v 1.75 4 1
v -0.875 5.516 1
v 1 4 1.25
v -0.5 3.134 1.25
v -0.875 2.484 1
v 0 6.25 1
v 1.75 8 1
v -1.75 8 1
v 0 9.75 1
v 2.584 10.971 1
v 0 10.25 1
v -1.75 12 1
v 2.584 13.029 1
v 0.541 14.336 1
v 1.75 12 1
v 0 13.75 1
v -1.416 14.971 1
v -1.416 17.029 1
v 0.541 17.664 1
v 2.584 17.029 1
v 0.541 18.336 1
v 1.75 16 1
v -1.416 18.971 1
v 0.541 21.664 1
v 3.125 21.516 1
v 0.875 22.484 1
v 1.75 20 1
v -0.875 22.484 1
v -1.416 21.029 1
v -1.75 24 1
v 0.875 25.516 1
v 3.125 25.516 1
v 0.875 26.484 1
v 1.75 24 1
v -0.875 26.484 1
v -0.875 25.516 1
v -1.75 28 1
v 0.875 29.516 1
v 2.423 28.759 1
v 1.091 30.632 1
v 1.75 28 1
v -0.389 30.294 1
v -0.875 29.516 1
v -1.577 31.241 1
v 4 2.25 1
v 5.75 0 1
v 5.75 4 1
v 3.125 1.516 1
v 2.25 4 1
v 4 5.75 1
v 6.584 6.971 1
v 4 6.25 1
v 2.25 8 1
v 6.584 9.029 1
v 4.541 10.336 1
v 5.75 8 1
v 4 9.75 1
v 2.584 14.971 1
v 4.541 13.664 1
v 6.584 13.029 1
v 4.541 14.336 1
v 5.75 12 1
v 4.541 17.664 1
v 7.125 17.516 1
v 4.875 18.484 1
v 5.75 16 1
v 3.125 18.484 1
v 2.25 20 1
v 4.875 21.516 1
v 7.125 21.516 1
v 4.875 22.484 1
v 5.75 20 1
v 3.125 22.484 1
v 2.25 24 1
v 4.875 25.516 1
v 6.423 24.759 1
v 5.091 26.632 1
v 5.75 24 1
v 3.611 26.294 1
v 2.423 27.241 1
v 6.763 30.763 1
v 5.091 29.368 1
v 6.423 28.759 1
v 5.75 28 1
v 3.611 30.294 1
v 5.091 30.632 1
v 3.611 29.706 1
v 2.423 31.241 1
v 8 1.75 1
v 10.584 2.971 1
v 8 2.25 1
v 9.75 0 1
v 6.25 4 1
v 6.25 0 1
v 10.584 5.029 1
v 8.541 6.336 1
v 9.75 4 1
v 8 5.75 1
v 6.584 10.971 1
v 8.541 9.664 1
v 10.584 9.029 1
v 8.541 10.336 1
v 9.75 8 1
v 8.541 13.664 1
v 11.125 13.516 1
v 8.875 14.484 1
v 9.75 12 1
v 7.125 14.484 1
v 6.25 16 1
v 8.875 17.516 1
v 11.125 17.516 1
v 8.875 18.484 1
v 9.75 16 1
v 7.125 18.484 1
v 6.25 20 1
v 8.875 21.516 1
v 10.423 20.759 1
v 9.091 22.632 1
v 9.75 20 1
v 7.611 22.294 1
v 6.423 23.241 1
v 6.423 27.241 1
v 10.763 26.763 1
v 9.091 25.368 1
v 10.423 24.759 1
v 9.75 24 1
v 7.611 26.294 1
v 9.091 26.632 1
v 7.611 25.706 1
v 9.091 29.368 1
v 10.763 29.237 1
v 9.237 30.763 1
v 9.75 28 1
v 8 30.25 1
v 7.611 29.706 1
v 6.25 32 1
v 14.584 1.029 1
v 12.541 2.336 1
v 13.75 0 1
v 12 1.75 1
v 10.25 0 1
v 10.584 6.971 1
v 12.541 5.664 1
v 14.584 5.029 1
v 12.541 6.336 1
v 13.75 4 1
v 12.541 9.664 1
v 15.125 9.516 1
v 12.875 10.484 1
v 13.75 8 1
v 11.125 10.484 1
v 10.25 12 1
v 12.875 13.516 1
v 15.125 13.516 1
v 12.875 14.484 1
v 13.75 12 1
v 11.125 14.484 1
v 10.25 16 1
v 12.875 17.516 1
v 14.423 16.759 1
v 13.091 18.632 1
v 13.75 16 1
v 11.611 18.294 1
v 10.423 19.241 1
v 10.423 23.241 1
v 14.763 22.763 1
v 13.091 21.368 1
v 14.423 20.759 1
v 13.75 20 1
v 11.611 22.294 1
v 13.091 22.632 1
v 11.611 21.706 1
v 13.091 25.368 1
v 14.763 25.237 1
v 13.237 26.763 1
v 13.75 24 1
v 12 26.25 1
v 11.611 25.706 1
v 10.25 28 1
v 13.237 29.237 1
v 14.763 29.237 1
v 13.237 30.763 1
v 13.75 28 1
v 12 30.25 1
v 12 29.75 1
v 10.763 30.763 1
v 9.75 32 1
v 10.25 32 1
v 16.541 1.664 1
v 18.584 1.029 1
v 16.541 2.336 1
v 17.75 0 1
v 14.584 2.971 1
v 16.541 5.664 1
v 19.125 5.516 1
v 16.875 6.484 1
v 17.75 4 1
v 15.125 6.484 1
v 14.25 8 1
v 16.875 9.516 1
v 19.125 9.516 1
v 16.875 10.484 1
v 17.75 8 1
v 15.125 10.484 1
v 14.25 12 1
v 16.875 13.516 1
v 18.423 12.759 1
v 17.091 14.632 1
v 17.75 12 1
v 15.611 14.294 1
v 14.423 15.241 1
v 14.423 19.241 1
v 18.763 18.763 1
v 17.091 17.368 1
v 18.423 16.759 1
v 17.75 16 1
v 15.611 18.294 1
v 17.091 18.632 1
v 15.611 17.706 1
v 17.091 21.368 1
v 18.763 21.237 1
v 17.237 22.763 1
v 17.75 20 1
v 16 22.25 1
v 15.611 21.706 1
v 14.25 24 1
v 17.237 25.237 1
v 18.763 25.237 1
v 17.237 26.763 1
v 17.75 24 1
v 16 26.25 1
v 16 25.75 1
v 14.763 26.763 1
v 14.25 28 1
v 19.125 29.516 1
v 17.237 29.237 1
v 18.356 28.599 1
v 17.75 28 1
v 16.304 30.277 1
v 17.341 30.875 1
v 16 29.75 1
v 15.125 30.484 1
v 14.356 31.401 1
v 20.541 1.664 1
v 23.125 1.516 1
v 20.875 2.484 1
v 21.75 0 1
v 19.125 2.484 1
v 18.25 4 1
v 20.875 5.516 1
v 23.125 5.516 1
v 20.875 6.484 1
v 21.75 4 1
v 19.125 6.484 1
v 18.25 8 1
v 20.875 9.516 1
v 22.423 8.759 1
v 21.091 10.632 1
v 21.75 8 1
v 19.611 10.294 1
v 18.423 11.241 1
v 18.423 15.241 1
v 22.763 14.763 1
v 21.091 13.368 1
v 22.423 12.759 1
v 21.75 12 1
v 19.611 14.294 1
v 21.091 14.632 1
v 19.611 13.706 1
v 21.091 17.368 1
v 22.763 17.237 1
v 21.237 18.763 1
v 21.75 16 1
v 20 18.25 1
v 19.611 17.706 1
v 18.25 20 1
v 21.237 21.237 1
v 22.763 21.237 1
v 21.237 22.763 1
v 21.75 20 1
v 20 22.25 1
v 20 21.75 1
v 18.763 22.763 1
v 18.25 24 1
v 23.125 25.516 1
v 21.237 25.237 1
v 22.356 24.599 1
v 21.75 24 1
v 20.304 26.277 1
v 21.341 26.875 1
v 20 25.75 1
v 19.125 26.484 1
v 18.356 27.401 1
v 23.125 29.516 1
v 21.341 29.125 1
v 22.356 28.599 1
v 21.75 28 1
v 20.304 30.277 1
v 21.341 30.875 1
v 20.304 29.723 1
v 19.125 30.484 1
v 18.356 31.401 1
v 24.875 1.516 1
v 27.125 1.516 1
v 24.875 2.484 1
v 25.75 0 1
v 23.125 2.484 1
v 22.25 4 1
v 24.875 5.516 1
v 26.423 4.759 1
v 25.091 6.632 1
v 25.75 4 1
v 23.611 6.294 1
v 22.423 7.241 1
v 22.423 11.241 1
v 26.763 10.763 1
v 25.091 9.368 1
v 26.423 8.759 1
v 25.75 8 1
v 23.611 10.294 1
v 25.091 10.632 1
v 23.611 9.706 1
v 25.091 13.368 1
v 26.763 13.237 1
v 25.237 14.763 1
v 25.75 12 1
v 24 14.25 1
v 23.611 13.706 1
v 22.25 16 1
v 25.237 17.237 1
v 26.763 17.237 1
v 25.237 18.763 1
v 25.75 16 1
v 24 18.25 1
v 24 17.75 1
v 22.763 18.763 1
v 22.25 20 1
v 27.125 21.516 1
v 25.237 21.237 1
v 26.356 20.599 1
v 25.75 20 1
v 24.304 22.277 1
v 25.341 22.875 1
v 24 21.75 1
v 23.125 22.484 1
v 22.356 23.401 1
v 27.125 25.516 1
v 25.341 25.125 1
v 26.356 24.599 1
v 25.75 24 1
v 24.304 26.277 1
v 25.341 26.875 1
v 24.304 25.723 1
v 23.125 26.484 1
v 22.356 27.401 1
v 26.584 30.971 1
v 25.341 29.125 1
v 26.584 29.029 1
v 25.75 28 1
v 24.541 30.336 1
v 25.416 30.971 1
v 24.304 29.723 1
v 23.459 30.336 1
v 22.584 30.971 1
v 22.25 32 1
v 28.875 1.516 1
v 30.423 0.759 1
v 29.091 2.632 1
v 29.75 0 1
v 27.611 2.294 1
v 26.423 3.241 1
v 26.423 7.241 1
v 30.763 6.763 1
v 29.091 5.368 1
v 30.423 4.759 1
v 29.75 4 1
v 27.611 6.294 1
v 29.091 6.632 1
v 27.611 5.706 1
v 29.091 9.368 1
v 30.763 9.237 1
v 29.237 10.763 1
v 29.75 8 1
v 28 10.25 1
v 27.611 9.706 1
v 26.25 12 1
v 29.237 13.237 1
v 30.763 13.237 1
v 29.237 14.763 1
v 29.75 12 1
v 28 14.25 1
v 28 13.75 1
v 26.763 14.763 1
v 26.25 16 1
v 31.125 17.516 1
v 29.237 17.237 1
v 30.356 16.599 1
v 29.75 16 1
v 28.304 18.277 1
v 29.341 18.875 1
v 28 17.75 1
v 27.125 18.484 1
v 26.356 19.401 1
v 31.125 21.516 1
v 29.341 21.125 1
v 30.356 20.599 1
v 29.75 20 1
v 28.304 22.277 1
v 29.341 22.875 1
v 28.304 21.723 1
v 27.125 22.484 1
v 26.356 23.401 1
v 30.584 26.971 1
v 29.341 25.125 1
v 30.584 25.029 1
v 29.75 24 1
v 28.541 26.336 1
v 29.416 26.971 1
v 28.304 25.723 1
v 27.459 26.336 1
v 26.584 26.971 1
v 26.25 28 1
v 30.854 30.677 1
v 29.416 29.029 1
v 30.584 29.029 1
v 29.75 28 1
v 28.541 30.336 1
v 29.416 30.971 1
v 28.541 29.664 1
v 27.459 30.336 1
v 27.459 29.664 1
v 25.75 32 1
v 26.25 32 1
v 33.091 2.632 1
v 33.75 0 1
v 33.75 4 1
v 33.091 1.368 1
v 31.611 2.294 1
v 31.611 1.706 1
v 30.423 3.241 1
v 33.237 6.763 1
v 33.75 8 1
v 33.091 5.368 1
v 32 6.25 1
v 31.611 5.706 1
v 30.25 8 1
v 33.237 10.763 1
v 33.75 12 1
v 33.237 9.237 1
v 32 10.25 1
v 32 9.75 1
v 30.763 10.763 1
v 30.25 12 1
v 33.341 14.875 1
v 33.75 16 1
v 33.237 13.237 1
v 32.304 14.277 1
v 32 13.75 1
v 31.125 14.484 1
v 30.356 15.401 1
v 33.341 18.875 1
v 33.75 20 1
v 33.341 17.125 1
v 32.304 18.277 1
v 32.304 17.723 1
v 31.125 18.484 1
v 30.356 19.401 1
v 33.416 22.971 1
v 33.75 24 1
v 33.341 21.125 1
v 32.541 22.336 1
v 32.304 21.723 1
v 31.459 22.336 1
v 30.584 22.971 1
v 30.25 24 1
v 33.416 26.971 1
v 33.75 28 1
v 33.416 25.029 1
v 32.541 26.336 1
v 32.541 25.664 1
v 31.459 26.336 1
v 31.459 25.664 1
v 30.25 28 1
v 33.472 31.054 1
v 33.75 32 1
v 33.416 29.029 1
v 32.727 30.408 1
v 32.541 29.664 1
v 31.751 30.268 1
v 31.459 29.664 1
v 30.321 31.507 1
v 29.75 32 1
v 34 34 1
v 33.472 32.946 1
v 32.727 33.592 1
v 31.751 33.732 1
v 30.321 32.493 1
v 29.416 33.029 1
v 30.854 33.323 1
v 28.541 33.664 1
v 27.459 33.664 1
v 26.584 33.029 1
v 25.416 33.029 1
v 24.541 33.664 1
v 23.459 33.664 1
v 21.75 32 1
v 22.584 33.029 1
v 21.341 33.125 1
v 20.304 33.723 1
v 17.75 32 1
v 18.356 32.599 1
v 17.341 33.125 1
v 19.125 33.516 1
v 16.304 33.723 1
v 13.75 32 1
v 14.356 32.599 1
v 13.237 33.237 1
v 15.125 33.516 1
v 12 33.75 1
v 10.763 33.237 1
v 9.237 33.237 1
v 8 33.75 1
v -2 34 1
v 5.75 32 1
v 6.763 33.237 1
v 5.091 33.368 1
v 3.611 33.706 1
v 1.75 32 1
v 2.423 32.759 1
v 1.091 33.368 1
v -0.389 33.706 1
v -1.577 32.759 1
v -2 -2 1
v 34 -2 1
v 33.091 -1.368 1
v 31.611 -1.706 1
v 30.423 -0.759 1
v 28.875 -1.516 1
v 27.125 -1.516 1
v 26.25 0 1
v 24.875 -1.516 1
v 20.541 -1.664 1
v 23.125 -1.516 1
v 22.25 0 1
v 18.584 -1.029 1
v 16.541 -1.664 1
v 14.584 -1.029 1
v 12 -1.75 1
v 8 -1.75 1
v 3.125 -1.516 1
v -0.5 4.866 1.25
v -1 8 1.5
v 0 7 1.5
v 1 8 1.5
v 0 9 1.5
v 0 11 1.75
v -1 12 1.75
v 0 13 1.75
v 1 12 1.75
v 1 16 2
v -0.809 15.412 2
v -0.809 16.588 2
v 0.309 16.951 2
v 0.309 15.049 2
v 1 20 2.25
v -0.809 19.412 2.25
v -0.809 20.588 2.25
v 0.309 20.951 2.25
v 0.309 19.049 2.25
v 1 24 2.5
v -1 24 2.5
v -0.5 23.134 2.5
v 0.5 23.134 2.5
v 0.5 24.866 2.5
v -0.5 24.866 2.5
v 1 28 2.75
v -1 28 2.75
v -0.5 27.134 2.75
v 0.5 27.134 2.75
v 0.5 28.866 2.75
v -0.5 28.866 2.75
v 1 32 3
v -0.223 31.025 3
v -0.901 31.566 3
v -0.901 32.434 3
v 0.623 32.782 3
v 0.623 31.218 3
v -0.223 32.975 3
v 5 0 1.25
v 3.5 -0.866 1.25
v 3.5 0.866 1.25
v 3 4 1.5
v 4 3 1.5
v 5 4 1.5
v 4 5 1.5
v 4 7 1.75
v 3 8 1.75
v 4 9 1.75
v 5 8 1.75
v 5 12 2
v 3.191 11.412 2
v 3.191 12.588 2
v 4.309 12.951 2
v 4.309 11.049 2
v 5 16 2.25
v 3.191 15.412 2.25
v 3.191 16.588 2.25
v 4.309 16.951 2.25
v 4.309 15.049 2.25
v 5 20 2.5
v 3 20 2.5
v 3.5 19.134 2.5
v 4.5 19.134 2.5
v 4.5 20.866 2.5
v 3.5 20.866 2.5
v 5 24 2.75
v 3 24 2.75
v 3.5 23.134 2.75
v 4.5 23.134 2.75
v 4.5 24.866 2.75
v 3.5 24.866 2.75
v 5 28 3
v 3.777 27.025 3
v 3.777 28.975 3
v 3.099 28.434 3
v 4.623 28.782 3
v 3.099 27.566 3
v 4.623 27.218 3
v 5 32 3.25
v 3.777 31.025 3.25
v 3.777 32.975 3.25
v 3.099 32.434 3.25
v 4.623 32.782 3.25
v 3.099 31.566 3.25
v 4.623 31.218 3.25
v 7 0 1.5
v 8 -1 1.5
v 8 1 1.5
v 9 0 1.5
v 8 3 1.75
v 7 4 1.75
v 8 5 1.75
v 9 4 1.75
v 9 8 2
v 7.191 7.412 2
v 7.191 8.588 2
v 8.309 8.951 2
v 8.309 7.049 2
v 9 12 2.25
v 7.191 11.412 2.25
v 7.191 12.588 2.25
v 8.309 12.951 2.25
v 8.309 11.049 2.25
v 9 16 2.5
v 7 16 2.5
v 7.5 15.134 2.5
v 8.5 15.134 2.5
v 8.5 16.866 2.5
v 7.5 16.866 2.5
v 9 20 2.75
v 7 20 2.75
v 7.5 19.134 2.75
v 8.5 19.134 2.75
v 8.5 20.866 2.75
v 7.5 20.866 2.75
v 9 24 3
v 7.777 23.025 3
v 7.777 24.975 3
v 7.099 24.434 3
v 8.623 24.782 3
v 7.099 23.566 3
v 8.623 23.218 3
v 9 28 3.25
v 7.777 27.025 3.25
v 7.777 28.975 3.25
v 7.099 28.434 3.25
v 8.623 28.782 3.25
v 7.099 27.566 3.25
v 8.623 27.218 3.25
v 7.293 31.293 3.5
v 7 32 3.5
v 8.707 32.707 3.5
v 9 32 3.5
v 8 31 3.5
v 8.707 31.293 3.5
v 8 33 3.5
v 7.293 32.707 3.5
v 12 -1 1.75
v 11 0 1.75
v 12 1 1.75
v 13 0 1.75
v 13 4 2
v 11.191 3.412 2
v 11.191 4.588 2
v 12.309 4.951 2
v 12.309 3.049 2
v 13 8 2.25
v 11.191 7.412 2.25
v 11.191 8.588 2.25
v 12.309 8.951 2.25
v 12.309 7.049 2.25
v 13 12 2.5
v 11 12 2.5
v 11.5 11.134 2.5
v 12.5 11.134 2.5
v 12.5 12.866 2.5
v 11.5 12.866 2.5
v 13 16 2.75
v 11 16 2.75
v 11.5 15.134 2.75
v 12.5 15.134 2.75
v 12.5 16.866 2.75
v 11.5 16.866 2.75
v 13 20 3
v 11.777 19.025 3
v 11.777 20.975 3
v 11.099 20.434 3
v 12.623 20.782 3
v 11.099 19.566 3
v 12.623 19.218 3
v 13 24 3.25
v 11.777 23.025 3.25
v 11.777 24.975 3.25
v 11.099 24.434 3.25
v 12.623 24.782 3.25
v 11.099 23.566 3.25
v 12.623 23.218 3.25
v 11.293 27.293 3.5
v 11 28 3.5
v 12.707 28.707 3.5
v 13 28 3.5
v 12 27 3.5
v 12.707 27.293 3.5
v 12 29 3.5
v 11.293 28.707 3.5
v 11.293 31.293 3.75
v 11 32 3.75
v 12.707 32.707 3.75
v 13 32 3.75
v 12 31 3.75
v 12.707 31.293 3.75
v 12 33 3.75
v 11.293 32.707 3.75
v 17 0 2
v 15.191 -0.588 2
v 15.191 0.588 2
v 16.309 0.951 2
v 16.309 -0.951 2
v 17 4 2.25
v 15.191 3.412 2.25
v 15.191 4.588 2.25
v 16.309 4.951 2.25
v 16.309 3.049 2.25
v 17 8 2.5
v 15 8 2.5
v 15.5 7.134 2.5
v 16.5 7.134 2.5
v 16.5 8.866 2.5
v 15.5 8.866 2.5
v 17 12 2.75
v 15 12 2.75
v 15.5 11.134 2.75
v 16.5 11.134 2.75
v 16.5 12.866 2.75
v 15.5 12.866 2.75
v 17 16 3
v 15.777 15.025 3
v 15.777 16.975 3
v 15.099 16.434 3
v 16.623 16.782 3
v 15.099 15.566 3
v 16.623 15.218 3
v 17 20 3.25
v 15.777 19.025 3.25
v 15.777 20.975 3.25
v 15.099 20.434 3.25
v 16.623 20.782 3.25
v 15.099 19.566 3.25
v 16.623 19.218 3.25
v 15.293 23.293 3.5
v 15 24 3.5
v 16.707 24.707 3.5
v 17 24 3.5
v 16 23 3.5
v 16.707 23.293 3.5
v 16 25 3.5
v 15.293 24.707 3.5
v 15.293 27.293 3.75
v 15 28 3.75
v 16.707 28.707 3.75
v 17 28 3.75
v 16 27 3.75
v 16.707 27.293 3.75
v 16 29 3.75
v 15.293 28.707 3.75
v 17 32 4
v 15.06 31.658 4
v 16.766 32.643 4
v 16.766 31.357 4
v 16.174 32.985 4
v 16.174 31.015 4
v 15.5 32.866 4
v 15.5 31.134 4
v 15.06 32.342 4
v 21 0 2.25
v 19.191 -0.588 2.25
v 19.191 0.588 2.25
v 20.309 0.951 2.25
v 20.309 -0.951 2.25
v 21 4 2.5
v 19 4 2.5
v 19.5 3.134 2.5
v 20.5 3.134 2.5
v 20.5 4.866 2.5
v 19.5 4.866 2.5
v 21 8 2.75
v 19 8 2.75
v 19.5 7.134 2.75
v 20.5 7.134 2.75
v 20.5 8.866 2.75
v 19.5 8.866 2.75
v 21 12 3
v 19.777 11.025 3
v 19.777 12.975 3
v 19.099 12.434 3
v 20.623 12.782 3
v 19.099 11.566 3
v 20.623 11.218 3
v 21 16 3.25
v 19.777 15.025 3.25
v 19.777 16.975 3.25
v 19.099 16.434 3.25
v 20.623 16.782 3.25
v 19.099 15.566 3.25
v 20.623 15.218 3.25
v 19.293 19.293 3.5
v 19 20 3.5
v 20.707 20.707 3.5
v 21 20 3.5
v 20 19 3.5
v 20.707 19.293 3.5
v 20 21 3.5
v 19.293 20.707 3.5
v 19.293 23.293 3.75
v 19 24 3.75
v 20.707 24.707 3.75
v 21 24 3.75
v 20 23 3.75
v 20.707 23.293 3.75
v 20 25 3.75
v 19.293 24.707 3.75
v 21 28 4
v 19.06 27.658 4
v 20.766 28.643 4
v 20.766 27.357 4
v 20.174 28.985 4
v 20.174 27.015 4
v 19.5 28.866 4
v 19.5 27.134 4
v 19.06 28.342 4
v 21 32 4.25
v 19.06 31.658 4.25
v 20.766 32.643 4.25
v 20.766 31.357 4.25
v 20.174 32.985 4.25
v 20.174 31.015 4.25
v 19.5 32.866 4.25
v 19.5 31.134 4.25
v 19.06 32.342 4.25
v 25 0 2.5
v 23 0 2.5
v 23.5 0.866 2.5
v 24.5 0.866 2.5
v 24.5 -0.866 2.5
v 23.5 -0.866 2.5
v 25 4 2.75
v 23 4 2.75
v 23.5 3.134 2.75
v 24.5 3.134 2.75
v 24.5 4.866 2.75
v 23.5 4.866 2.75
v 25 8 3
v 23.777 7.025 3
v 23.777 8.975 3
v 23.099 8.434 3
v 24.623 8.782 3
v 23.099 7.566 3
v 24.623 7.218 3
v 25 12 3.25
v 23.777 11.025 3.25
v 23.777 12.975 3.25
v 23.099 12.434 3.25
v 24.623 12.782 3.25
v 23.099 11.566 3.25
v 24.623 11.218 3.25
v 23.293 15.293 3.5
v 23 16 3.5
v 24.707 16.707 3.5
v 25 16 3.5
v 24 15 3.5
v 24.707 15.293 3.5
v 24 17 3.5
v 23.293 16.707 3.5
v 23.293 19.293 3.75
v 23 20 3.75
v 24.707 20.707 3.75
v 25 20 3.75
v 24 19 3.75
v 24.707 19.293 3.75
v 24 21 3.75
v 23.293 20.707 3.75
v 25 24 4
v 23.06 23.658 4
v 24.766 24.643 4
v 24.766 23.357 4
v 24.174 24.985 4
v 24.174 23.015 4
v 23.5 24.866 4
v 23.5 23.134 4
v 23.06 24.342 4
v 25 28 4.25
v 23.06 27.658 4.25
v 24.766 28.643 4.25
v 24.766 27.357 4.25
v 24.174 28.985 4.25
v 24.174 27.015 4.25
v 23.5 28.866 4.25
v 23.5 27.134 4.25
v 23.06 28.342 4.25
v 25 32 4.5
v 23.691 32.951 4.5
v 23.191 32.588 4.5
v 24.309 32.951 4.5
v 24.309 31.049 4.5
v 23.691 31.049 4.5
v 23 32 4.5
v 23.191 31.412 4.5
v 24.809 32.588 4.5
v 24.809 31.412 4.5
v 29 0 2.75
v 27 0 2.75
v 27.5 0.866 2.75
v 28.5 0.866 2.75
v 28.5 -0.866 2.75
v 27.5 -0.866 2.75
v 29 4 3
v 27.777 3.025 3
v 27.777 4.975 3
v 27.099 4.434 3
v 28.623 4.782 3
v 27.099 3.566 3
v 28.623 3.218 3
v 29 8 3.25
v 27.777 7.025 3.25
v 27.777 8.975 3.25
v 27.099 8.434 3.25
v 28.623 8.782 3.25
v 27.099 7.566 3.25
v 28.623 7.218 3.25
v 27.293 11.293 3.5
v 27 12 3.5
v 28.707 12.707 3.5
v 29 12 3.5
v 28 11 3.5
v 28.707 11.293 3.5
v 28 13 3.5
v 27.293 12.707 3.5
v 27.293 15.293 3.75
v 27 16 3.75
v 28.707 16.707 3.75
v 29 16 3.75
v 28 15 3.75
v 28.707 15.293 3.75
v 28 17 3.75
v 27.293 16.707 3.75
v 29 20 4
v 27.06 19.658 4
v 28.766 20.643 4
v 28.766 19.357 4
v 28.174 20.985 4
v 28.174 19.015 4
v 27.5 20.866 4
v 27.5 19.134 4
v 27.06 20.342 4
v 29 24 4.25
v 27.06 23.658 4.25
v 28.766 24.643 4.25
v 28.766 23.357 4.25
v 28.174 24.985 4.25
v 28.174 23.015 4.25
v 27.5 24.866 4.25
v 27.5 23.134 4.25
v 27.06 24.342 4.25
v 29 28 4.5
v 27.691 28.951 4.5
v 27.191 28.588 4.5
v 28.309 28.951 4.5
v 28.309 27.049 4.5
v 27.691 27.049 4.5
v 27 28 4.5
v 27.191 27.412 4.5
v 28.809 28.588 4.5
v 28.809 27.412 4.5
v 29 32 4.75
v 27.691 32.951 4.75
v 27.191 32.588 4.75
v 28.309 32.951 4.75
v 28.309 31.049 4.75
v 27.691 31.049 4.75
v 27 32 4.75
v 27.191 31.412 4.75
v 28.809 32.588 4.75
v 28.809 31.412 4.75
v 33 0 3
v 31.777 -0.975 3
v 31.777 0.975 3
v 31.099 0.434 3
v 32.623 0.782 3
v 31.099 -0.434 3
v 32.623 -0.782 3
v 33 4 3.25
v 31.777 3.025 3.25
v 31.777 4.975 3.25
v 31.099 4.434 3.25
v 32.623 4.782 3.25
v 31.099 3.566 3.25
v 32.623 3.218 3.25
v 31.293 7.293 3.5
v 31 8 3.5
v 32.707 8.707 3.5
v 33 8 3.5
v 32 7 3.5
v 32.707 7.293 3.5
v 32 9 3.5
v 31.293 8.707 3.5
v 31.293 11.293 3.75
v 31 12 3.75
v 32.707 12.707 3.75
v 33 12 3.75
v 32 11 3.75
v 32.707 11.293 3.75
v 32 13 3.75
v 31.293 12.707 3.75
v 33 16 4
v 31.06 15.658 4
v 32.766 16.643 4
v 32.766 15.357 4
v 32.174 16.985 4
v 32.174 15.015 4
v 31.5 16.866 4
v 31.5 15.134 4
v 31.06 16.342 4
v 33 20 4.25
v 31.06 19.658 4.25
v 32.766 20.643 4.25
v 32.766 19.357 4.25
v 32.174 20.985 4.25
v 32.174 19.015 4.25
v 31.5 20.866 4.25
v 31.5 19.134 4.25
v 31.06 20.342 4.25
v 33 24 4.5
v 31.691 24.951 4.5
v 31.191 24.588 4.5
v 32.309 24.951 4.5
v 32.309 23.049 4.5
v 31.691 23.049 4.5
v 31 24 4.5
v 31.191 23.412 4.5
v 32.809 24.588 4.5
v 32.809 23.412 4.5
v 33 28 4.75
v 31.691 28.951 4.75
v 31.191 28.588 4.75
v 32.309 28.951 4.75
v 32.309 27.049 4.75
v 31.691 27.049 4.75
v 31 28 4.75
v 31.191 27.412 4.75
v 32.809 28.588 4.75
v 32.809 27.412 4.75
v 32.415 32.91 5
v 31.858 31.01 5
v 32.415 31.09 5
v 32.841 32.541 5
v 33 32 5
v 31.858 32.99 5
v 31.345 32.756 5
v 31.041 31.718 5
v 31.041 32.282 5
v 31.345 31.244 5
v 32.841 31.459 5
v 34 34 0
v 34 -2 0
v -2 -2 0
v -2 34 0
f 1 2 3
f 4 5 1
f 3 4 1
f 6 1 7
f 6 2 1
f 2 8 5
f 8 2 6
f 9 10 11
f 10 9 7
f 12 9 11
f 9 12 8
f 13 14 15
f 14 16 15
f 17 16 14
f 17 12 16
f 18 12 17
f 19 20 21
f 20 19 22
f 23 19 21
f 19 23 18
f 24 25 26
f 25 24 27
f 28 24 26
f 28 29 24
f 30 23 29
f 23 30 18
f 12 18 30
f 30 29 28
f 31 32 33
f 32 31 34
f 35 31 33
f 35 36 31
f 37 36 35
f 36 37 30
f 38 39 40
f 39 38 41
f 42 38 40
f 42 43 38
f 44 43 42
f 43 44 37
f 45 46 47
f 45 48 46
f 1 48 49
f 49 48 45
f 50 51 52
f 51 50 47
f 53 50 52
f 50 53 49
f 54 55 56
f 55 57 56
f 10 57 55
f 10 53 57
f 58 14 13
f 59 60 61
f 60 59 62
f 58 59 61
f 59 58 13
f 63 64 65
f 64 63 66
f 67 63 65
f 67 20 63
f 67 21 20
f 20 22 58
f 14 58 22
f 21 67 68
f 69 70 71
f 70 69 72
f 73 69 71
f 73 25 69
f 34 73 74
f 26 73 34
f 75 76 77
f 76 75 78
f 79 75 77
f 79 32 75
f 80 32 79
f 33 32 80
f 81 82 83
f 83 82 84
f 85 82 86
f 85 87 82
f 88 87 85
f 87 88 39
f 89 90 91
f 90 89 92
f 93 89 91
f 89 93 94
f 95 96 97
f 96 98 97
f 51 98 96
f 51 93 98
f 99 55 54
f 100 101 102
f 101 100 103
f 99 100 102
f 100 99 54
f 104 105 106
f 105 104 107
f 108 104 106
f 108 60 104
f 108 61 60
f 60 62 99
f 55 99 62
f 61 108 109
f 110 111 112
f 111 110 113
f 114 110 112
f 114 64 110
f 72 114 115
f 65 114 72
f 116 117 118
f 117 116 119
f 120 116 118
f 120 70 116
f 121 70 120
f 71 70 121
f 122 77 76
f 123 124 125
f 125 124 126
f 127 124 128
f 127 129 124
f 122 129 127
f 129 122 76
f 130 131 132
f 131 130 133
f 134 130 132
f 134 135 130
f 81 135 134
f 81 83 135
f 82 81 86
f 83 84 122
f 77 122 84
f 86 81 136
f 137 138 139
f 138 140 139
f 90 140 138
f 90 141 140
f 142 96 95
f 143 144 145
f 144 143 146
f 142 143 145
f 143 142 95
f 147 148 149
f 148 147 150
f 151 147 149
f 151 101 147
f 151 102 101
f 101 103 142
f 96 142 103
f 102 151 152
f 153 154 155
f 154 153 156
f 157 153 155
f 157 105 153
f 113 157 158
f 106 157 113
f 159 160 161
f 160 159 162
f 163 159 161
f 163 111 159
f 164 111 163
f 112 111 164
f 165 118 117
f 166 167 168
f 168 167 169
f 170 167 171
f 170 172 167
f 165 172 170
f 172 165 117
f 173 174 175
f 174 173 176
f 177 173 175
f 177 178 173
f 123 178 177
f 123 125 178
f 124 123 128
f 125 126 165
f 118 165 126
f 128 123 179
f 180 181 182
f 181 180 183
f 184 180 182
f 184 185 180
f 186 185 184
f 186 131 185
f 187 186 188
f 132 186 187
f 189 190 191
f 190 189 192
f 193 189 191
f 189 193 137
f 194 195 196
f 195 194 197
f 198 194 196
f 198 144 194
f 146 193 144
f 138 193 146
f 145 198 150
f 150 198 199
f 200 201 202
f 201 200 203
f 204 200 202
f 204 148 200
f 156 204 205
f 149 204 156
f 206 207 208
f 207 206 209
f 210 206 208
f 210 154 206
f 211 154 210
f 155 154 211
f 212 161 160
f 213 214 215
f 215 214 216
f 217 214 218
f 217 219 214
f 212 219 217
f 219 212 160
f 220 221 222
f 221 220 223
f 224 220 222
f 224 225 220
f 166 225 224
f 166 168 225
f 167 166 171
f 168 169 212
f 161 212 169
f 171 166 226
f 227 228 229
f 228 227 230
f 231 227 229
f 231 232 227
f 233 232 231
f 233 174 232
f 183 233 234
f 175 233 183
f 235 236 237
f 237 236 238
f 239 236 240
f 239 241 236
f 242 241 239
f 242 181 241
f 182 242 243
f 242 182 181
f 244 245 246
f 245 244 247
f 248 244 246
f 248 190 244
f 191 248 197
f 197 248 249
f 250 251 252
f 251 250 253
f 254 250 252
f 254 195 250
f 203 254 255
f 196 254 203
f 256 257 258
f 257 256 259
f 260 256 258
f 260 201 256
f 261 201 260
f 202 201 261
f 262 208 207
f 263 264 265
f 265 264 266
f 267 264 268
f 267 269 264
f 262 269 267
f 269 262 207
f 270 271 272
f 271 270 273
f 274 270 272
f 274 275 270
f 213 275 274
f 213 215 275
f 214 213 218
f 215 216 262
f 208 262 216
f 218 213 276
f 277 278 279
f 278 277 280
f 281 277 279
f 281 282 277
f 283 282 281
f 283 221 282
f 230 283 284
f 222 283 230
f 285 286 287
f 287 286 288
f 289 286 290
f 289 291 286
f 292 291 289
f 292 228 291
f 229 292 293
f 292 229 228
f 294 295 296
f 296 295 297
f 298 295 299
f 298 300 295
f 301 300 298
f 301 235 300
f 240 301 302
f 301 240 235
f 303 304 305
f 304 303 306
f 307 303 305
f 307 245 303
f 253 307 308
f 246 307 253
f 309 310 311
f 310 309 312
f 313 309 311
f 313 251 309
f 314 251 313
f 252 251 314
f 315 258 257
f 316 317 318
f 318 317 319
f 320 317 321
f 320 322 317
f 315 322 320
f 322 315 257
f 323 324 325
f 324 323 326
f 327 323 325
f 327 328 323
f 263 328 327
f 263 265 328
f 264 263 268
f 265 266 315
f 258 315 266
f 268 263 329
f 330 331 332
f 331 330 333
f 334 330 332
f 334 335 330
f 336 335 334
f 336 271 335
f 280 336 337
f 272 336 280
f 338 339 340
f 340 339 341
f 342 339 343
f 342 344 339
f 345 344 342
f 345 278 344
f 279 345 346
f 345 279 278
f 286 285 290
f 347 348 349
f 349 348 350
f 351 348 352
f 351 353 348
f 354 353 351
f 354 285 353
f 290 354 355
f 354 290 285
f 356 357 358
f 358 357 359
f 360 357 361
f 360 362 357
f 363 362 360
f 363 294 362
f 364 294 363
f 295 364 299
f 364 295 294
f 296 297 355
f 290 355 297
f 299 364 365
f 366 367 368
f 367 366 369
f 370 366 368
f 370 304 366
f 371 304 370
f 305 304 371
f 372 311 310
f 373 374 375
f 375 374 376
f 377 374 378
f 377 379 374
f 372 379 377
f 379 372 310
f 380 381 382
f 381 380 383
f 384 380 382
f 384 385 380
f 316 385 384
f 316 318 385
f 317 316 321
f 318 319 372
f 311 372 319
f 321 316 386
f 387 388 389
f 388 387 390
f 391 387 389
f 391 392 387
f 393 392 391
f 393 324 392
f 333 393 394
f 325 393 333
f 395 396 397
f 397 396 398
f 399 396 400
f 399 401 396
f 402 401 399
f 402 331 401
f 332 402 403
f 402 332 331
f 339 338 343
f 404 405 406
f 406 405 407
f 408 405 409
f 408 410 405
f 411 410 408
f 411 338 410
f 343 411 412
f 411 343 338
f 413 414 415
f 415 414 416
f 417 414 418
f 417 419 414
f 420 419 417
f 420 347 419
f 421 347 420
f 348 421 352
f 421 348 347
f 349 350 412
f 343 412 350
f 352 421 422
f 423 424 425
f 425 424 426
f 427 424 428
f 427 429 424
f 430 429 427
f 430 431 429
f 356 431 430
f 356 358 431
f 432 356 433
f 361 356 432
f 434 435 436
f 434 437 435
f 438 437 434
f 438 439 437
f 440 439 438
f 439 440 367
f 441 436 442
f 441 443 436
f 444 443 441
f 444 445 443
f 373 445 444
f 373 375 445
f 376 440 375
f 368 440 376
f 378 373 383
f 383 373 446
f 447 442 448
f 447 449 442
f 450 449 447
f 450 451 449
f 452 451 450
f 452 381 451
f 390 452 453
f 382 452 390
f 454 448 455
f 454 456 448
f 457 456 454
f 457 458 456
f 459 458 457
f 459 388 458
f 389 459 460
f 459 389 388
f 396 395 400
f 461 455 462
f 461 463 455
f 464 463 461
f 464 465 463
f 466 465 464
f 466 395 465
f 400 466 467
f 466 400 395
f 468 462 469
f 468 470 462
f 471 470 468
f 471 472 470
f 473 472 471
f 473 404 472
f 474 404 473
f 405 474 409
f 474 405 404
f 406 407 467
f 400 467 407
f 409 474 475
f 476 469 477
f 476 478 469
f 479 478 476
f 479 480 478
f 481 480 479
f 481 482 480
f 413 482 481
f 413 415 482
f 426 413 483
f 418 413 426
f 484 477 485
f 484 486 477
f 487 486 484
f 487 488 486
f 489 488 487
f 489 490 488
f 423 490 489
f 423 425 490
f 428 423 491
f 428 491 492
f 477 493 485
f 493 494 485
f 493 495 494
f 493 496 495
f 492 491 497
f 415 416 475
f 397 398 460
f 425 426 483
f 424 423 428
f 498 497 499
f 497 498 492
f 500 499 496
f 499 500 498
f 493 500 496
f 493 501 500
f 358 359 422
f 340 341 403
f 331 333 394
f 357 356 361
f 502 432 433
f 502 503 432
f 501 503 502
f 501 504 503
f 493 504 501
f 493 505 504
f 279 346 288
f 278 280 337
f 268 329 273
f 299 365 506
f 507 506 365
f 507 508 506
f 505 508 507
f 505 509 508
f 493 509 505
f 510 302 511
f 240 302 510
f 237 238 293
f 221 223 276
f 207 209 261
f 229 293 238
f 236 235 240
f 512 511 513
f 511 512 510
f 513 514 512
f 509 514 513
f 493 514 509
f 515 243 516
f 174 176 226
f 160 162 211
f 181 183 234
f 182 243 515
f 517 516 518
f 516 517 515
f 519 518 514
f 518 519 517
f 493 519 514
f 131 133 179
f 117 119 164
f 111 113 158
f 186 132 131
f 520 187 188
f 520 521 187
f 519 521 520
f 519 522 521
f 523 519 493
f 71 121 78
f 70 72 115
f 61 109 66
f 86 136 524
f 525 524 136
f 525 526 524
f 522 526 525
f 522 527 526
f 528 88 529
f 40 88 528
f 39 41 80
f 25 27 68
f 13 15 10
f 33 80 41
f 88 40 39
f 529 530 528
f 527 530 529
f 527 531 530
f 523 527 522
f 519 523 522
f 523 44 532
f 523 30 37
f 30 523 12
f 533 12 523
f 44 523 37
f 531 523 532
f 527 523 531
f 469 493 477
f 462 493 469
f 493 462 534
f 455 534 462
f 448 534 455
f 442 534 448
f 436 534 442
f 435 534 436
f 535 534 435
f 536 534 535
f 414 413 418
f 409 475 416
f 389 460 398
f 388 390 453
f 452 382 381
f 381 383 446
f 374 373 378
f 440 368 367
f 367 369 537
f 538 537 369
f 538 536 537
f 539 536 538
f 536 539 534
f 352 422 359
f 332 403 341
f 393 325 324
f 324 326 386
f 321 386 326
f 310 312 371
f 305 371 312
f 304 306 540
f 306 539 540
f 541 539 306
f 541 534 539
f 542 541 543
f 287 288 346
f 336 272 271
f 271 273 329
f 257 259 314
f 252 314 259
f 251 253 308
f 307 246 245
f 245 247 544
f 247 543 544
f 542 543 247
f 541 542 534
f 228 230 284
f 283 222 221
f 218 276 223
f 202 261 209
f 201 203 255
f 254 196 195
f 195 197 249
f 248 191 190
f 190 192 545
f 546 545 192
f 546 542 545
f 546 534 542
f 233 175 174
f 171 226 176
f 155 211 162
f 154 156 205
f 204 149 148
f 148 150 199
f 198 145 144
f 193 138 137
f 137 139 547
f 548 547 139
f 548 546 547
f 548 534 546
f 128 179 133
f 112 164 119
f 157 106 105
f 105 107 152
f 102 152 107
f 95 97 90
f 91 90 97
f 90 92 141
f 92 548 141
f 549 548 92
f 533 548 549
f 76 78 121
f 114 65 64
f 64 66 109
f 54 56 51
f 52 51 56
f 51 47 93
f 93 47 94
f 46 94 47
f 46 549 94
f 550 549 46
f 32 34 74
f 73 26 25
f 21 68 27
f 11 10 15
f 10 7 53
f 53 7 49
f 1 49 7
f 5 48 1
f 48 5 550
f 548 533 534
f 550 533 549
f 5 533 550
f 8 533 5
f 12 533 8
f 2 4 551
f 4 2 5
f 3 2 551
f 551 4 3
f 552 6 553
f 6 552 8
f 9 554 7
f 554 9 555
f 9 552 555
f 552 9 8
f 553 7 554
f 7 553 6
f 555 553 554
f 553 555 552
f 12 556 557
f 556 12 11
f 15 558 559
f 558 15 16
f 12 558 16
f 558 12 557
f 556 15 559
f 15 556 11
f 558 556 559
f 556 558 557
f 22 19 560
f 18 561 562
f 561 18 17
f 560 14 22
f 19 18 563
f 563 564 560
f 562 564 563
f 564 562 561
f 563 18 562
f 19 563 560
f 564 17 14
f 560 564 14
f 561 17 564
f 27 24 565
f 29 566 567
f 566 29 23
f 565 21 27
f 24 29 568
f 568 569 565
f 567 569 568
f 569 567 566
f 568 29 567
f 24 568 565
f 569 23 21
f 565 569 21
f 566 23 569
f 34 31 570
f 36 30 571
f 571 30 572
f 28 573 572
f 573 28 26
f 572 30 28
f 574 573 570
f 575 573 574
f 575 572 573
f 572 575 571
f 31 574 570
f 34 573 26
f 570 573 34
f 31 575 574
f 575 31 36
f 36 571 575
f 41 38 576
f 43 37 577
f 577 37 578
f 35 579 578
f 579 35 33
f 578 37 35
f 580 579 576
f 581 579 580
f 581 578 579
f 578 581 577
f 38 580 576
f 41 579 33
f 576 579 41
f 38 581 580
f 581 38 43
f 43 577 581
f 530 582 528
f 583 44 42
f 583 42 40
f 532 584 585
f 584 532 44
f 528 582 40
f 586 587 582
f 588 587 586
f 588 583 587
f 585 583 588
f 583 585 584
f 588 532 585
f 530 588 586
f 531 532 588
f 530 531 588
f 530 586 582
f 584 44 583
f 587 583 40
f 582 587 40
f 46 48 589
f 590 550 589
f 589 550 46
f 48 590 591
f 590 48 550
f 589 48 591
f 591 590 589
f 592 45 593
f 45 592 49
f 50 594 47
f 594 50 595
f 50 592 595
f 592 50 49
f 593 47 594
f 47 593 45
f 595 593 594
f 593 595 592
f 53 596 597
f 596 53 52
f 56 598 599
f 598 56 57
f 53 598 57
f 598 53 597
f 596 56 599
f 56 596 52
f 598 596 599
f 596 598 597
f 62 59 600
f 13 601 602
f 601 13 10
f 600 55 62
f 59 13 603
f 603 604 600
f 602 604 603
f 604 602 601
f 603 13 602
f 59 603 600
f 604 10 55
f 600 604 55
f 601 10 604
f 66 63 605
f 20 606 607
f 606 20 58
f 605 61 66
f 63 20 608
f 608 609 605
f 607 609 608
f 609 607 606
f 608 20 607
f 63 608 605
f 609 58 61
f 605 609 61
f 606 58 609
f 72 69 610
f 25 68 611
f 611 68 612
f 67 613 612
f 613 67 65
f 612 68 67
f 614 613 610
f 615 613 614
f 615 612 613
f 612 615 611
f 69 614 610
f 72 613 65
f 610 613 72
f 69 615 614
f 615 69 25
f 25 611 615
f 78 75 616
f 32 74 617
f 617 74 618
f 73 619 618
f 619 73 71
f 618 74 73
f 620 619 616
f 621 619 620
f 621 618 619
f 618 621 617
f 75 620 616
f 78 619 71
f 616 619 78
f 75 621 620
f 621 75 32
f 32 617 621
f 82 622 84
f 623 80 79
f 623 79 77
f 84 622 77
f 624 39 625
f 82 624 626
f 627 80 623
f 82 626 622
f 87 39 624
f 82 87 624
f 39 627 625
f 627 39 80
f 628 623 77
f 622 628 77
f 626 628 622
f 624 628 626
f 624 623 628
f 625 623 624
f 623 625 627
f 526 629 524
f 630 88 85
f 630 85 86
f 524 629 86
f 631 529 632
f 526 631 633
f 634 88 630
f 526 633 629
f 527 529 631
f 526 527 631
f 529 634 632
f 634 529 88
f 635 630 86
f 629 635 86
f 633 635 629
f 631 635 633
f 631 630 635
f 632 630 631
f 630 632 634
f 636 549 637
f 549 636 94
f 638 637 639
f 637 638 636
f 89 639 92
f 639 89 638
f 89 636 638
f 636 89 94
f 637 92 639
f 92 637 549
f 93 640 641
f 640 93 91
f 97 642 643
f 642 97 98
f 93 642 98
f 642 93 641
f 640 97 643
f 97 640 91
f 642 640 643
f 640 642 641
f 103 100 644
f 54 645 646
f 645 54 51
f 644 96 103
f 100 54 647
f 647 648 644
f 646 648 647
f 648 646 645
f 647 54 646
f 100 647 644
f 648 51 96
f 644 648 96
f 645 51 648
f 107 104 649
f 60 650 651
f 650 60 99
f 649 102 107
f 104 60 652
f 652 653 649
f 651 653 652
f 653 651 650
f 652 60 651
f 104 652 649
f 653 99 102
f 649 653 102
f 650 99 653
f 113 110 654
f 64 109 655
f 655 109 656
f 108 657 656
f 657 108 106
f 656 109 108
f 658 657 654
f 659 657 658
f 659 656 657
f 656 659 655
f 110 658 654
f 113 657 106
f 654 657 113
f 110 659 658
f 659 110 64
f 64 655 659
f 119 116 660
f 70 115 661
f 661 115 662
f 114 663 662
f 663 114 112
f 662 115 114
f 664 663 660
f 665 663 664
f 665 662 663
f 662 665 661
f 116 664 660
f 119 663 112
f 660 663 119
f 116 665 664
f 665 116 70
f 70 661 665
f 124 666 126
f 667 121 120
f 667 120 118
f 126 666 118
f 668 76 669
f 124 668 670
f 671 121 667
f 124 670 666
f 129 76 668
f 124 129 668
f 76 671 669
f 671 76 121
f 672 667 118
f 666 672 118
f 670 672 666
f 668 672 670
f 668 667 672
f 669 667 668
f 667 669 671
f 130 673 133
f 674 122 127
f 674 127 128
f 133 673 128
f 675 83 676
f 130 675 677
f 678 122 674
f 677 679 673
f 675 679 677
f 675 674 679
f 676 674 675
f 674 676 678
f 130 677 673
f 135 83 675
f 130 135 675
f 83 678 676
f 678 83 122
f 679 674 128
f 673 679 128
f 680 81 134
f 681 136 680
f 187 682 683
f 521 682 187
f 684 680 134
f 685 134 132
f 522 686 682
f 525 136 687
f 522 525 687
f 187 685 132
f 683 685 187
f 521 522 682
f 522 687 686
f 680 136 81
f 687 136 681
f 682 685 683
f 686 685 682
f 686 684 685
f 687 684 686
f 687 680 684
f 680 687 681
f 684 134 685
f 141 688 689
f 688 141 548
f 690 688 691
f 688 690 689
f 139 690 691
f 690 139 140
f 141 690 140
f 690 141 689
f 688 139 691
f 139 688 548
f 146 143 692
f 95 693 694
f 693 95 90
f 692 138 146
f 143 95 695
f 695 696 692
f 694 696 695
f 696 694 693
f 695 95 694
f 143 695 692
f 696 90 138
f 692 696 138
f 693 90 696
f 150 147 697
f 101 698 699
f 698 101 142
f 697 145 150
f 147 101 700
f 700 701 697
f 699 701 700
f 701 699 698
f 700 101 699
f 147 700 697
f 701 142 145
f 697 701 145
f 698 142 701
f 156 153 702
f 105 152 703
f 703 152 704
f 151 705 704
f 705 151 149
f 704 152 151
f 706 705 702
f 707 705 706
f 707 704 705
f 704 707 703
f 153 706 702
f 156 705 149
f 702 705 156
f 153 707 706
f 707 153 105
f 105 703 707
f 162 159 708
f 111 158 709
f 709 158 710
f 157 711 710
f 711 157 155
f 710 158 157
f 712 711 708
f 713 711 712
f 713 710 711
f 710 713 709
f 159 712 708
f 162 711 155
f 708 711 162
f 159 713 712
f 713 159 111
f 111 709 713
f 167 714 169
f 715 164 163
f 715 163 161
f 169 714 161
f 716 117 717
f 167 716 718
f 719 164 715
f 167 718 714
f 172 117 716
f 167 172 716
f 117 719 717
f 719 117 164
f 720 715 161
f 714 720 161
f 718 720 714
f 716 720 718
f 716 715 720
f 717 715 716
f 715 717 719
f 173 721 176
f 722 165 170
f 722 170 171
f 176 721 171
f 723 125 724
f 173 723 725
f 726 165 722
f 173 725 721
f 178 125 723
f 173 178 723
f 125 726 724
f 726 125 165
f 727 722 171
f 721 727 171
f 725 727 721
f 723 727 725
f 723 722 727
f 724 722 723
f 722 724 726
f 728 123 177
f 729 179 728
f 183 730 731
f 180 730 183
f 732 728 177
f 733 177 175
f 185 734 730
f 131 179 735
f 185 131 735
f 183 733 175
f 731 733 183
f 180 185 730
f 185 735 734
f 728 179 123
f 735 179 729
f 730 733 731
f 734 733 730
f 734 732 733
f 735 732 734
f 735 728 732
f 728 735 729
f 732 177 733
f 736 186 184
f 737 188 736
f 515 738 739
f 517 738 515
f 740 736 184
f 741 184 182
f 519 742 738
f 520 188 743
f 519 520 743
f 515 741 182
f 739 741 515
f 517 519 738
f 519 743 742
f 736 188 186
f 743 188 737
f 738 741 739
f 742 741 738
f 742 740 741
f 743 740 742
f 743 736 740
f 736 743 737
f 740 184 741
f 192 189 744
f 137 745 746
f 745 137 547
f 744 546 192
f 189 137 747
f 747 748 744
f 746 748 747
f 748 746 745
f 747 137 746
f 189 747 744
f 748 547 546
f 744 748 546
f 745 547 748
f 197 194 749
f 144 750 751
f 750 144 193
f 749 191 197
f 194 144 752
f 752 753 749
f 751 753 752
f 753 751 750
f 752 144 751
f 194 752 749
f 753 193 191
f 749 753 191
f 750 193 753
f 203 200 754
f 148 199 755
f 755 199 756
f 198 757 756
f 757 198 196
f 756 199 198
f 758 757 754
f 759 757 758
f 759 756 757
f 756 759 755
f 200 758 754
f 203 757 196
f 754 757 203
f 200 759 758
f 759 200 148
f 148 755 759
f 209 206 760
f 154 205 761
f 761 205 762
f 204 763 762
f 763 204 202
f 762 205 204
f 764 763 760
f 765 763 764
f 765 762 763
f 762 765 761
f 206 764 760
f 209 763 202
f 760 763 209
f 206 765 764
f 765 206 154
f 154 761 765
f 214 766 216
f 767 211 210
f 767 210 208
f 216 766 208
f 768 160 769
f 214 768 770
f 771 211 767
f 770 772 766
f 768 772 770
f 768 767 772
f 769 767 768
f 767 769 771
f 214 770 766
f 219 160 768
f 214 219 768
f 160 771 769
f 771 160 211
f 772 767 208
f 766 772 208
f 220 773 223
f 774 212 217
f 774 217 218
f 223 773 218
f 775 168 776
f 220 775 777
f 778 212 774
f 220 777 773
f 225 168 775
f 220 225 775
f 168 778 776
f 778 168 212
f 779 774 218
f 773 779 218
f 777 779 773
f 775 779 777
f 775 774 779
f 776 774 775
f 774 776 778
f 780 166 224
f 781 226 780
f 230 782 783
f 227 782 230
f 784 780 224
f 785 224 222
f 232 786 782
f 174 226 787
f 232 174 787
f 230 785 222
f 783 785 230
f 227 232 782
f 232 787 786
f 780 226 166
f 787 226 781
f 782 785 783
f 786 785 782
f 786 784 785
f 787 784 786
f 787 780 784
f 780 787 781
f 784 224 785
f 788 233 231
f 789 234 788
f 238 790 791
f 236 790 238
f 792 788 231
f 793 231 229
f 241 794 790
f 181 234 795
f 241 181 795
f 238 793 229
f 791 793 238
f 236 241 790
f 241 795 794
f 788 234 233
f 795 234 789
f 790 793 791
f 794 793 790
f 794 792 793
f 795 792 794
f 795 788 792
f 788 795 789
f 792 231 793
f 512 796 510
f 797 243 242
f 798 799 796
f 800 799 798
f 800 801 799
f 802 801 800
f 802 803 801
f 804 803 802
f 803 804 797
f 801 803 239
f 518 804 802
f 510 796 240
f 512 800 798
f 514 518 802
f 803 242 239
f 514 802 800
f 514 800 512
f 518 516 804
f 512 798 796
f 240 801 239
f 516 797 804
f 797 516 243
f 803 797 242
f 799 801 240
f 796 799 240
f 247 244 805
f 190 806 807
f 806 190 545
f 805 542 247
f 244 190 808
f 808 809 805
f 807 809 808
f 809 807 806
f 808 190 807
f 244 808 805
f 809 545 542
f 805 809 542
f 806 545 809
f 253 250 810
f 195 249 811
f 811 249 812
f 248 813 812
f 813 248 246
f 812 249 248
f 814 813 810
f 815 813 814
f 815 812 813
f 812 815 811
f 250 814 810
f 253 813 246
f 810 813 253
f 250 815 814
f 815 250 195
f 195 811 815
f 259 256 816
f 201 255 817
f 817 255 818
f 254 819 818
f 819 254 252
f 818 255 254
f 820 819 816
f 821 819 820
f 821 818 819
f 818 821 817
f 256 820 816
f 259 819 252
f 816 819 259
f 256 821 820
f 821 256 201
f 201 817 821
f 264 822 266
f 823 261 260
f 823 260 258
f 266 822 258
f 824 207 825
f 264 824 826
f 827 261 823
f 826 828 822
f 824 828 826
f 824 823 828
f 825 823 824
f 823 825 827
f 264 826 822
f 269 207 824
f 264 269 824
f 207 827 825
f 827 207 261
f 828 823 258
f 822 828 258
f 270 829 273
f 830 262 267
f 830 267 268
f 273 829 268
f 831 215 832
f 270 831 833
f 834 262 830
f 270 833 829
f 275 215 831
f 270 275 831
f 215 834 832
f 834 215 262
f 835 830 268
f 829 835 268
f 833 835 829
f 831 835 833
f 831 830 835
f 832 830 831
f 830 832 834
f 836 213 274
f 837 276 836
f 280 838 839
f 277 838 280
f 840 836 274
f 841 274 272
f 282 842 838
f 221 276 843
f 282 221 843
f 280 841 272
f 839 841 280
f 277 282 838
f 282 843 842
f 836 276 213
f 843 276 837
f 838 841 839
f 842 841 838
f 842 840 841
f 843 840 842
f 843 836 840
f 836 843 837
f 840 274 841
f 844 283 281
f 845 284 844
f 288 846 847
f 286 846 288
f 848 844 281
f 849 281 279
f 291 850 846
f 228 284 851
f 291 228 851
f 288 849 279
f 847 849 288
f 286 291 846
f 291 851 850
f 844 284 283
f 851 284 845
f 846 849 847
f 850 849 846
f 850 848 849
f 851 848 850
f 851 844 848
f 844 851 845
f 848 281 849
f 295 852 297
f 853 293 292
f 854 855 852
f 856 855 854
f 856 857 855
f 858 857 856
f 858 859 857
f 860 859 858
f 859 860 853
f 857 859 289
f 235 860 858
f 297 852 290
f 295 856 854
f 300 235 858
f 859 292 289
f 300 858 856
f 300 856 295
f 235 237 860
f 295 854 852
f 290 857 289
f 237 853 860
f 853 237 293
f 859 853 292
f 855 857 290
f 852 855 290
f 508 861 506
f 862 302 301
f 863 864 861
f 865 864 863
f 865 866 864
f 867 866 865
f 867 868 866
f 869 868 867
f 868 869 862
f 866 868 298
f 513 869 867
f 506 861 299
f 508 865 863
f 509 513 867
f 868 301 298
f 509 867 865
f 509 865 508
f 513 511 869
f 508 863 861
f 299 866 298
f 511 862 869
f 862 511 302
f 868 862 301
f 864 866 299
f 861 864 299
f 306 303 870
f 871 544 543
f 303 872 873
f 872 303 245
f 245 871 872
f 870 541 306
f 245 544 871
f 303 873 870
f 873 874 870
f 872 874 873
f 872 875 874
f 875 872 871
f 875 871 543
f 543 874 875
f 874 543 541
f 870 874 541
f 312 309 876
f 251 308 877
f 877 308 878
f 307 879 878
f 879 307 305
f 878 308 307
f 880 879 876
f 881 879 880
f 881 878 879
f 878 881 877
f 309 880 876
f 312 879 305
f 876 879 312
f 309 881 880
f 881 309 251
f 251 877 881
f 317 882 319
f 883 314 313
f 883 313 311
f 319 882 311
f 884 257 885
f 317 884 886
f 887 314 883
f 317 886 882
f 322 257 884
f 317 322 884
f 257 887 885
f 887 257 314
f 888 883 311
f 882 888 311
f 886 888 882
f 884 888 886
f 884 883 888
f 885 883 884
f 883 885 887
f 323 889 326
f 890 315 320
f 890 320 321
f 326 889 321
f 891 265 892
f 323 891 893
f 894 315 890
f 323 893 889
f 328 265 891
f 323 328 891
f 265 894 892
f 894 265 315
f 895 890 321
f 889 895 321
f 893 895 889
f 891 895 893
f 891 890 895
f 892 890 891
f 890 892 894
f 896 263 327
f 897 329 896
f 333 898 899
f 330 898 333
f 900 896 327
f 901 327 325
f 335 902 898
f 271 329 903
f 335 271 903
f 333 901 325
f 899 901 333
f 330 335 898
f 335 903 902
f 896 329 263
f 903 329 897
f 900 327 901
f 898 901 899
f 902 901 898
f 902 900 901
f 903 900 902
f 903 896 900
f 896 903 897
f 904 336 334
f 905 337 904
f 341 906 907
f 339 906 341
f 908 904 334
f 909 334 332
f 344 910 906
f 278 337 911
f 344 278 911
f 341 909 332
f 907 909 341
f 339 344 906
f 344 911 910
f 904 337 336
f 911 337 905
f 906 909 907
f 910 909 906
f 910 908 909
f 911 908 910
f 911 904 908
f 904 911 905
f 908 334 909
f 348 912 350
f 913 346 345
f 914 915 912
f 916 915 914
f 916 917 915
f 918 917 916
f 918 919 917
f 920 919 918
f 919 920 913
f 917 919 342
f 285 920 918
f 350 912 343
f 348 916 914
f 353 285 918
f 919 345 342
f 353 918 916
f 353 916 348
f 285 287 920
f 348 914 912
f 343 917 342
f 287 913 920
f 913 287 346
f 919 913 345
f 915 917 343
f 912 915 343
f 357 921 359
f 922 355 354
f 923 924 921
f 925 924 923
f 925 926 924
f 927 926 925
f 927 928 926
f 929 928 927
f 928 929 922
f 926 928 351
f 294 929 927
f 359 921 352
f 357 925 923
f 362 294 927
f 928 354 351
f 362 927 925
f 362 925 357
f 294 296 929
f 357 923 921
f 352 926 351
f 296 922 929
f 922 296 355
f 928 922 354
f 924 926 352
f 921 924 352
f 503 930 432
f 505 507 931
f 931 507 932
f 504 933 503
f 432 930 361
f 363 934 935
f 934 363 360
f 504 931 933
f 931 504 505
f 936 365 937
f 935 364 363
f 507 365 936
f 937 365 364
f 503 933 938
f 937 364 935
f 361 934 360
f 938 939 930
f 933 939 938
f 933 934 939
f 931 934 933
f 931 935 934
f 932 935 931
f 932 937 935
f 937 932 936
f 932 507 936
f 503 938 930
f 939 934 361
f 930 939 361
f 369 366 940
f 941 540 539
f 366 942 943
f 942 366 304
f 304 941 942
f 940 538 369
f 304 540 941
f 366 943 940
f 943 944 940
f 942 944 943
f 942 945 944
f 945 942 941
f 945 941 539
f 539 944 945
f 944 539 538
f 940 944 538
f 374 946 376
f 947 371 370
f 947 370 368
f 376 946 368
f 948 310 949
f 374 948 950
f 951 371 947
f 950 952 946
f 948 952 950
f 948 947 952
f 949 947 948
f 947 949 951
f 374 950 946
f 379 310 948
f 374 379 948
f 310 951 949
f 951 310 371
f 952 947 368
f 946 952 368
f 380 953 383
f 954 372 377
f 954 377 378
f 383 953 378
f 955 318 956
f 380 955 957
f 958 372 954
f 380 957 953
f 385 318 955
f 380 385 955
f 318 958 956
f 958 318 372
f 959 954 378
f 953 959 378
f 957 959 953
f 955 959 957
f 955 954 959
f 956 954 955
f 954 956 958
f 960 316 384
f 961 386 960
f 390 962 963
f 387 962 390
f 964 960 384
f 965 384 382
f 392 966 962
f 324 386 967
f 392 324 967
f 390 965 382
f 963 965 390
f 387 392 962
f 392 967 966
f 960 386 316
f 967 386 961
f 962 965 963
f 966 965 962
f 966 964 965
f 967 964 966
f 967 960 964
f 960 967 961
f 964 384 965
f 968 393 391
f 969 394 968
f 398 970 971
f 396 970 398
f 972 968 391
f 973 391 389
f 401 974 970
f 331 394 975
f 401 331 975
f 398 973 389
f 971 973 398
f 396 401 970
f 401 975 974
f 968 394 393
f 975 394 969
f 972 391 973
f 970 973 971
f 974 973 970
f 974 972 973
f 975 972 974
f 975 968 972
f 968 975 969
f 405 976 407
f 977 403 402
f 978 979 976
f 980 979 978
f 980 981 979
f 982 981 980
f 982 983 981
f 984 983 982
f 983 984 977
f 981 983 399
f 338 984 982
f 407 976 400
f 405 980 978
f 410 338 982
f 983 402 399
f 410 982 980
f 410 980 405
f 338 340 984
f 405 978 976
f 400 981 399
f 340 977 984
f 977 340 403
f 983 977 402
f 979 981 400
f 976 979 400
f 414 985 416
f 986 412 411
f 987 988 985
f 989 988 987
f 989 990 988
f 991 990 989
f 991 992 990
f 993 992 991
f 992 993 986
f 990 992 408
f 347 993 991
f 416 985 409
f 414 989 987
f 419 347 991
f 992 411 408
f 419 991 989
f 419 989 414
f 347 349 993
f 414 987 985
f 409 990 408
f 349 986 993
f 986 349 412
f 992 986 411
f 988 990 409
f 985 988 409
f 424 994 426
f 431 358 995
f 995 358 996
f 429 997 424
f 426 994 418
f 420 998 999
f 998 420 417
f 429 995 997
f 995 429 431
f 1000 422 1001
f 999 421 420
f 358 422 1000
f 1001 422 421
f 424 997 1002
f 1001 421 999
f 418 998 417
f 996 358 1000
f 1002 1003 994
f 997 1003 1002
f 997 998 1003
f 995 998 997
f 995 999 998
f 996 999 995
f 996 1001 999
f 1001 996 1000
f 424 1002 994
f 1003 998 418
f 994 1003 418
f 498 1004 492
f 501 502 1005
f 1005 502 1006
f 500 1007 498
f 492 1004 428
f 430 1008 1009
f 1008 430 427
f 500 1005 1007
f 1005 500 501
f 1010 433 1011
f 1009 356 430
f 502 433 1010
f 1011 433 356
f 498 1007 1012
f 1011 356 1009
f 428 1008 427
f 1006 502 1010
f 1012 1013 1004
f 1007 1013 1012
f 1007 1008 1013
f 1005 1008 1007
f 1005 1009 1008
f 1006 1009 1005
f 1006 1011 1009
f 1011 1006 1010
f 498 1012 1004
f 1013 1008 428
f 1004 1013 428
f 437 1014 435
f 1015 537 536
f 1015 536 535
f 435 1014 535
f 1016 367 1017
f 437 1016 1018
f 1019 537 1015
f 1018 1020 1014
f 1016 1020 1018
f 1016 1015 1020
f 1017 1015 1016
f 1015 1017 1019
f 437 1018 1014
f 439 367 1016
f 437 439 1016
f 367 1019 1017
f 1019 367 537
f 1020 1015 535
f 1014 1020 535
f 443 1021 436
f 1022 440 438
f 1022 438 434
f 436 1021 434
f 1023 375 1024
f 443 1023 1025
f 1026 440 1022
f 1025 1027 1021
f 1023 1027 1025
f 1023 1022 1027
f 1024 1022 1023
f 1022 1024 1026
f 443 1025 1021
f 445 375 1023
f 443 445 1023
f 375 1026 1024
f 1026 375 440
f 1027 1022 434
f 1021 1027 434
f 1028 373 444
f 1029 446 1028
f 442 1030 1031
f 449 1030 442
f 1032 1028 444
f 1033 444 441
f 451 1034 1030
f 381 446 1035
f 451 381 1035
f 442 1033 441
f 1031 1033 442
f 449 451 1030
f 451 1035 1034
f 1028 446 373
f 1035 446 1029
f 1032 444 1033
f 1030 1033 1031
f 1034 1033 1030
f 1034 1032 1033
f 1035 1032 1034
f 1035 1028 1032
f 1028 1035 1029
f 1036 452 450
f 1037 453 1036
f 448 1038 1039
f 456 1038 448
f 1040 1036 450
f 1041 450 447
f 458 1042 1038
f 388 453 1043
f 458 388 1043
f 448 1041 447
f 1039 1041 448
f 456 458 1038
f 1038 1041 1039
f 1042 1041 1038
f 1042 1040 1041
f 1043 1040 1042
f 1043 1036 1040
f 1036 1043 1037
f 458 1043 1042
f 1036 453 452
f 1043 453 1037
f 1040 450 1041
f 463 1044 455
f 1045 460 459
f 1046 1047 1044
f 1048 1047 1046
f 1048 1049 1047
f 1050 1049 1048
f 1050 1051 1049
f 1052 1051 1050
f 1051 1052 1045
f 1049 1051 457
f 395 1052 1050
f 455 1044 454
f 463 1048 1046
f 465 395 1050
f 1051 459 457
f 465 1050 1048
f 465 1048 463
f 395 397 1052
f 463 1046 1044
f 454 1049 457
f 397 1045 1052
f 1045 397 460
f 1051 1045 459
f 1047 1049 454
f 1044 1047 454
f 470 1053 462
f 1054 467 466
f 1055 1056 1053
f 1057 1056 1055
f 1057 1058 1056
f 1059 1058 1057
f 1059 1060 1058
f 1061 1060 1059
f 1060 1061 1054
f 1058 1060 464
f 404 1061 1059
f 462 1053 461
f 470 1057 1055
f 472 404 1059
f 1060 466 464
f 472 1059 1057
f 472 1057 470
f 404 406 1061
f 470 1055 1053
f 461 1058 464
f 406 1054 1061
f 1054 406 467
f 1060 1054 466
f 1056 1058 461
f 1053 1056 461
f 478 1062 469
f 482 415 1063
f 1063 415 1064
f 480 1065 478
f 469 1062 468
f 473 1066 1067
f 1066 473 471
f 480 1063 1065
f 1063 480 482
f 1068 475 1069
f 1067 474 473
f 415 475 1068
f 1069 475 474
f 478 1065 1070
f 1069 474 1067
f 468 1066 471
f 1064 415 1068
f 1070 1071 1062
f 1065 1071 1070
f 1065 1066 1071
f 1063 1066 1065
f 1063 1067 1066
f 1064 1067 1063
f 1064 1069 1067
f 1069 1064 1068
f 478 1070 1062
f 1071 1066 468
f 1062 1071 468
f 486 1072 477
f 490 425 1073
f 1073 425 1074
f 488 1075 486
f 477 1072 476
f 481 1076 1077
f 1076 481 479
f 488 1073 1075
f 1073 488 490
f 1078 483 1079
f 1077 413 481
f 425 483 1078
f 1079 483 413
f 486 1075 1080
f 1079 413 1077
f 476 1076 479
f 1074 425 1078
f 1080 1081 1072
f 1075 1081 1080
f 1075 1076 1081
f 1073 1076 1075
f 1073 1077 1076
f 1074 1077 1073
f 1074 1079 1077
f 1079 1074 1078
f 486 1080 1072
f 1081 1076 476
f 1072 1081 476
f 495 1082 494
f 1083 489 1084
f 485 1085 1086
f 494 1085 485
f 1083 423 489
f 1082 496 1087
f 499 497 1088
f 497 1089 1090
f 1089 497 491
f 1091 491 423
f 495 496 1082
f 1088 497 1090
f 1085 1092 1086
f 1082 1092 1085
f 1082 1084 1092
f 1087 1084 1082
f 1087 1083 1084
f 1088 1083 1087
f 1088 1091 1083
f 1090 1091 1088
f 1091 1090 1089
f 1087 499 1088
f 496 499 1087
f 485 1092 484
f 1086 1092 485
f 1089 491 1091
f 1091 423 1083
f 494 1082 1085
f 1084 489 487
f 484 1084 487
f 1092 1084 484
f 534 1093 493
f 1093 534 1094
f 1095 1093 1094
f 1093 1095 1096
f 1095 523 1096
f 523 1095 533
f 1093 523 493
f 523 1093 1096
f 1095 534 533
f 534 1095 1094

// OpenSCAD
//Makerbot Hackathon 2013
//PixSCAD
//Proof Of Concept for a picture to OpenSCAD Customizable Thingi
//Team - Alex Tanchoco (LionAlex)
//	Cameron Stern (SternDesignworks)
//	Allister McKenzie (Dion)


grid_height = 8;
grid_width = 8;

grid_overall_diameter = 4;
grid_lower_diameter = 3.5;
grid_upper_diameter = 2; // 
grid_maximum_height = 5; //

grid_polygons = 3;

grid_base_height = 1;

translate( [-grid_overall_diameter/2, -grid_overall_diameter/2,0] )
	cube( [grid_overall_diameter*(grid_width+1), grid_overall_diameter*(grid_height+1),grid_base_height] );

for ( x=[0:1:grid_height] ) {
	for( y=[0:1:grid_width] ) {
		translate( [x*grid_overall_diameter,y*grid_overall_diameter,grid_base_height] )
			cylinder( h=(x+y)/4, r1=grid_lower_diameter/2, r2=grid_upper_diameter/2, $fn=grid_polygons+x/2+y/2 );
			//cylinder( h=(x+y)/4, r=grid_lower_diameter/2, $fn=grid_polygons+x/2+y/2 );
	}
}
